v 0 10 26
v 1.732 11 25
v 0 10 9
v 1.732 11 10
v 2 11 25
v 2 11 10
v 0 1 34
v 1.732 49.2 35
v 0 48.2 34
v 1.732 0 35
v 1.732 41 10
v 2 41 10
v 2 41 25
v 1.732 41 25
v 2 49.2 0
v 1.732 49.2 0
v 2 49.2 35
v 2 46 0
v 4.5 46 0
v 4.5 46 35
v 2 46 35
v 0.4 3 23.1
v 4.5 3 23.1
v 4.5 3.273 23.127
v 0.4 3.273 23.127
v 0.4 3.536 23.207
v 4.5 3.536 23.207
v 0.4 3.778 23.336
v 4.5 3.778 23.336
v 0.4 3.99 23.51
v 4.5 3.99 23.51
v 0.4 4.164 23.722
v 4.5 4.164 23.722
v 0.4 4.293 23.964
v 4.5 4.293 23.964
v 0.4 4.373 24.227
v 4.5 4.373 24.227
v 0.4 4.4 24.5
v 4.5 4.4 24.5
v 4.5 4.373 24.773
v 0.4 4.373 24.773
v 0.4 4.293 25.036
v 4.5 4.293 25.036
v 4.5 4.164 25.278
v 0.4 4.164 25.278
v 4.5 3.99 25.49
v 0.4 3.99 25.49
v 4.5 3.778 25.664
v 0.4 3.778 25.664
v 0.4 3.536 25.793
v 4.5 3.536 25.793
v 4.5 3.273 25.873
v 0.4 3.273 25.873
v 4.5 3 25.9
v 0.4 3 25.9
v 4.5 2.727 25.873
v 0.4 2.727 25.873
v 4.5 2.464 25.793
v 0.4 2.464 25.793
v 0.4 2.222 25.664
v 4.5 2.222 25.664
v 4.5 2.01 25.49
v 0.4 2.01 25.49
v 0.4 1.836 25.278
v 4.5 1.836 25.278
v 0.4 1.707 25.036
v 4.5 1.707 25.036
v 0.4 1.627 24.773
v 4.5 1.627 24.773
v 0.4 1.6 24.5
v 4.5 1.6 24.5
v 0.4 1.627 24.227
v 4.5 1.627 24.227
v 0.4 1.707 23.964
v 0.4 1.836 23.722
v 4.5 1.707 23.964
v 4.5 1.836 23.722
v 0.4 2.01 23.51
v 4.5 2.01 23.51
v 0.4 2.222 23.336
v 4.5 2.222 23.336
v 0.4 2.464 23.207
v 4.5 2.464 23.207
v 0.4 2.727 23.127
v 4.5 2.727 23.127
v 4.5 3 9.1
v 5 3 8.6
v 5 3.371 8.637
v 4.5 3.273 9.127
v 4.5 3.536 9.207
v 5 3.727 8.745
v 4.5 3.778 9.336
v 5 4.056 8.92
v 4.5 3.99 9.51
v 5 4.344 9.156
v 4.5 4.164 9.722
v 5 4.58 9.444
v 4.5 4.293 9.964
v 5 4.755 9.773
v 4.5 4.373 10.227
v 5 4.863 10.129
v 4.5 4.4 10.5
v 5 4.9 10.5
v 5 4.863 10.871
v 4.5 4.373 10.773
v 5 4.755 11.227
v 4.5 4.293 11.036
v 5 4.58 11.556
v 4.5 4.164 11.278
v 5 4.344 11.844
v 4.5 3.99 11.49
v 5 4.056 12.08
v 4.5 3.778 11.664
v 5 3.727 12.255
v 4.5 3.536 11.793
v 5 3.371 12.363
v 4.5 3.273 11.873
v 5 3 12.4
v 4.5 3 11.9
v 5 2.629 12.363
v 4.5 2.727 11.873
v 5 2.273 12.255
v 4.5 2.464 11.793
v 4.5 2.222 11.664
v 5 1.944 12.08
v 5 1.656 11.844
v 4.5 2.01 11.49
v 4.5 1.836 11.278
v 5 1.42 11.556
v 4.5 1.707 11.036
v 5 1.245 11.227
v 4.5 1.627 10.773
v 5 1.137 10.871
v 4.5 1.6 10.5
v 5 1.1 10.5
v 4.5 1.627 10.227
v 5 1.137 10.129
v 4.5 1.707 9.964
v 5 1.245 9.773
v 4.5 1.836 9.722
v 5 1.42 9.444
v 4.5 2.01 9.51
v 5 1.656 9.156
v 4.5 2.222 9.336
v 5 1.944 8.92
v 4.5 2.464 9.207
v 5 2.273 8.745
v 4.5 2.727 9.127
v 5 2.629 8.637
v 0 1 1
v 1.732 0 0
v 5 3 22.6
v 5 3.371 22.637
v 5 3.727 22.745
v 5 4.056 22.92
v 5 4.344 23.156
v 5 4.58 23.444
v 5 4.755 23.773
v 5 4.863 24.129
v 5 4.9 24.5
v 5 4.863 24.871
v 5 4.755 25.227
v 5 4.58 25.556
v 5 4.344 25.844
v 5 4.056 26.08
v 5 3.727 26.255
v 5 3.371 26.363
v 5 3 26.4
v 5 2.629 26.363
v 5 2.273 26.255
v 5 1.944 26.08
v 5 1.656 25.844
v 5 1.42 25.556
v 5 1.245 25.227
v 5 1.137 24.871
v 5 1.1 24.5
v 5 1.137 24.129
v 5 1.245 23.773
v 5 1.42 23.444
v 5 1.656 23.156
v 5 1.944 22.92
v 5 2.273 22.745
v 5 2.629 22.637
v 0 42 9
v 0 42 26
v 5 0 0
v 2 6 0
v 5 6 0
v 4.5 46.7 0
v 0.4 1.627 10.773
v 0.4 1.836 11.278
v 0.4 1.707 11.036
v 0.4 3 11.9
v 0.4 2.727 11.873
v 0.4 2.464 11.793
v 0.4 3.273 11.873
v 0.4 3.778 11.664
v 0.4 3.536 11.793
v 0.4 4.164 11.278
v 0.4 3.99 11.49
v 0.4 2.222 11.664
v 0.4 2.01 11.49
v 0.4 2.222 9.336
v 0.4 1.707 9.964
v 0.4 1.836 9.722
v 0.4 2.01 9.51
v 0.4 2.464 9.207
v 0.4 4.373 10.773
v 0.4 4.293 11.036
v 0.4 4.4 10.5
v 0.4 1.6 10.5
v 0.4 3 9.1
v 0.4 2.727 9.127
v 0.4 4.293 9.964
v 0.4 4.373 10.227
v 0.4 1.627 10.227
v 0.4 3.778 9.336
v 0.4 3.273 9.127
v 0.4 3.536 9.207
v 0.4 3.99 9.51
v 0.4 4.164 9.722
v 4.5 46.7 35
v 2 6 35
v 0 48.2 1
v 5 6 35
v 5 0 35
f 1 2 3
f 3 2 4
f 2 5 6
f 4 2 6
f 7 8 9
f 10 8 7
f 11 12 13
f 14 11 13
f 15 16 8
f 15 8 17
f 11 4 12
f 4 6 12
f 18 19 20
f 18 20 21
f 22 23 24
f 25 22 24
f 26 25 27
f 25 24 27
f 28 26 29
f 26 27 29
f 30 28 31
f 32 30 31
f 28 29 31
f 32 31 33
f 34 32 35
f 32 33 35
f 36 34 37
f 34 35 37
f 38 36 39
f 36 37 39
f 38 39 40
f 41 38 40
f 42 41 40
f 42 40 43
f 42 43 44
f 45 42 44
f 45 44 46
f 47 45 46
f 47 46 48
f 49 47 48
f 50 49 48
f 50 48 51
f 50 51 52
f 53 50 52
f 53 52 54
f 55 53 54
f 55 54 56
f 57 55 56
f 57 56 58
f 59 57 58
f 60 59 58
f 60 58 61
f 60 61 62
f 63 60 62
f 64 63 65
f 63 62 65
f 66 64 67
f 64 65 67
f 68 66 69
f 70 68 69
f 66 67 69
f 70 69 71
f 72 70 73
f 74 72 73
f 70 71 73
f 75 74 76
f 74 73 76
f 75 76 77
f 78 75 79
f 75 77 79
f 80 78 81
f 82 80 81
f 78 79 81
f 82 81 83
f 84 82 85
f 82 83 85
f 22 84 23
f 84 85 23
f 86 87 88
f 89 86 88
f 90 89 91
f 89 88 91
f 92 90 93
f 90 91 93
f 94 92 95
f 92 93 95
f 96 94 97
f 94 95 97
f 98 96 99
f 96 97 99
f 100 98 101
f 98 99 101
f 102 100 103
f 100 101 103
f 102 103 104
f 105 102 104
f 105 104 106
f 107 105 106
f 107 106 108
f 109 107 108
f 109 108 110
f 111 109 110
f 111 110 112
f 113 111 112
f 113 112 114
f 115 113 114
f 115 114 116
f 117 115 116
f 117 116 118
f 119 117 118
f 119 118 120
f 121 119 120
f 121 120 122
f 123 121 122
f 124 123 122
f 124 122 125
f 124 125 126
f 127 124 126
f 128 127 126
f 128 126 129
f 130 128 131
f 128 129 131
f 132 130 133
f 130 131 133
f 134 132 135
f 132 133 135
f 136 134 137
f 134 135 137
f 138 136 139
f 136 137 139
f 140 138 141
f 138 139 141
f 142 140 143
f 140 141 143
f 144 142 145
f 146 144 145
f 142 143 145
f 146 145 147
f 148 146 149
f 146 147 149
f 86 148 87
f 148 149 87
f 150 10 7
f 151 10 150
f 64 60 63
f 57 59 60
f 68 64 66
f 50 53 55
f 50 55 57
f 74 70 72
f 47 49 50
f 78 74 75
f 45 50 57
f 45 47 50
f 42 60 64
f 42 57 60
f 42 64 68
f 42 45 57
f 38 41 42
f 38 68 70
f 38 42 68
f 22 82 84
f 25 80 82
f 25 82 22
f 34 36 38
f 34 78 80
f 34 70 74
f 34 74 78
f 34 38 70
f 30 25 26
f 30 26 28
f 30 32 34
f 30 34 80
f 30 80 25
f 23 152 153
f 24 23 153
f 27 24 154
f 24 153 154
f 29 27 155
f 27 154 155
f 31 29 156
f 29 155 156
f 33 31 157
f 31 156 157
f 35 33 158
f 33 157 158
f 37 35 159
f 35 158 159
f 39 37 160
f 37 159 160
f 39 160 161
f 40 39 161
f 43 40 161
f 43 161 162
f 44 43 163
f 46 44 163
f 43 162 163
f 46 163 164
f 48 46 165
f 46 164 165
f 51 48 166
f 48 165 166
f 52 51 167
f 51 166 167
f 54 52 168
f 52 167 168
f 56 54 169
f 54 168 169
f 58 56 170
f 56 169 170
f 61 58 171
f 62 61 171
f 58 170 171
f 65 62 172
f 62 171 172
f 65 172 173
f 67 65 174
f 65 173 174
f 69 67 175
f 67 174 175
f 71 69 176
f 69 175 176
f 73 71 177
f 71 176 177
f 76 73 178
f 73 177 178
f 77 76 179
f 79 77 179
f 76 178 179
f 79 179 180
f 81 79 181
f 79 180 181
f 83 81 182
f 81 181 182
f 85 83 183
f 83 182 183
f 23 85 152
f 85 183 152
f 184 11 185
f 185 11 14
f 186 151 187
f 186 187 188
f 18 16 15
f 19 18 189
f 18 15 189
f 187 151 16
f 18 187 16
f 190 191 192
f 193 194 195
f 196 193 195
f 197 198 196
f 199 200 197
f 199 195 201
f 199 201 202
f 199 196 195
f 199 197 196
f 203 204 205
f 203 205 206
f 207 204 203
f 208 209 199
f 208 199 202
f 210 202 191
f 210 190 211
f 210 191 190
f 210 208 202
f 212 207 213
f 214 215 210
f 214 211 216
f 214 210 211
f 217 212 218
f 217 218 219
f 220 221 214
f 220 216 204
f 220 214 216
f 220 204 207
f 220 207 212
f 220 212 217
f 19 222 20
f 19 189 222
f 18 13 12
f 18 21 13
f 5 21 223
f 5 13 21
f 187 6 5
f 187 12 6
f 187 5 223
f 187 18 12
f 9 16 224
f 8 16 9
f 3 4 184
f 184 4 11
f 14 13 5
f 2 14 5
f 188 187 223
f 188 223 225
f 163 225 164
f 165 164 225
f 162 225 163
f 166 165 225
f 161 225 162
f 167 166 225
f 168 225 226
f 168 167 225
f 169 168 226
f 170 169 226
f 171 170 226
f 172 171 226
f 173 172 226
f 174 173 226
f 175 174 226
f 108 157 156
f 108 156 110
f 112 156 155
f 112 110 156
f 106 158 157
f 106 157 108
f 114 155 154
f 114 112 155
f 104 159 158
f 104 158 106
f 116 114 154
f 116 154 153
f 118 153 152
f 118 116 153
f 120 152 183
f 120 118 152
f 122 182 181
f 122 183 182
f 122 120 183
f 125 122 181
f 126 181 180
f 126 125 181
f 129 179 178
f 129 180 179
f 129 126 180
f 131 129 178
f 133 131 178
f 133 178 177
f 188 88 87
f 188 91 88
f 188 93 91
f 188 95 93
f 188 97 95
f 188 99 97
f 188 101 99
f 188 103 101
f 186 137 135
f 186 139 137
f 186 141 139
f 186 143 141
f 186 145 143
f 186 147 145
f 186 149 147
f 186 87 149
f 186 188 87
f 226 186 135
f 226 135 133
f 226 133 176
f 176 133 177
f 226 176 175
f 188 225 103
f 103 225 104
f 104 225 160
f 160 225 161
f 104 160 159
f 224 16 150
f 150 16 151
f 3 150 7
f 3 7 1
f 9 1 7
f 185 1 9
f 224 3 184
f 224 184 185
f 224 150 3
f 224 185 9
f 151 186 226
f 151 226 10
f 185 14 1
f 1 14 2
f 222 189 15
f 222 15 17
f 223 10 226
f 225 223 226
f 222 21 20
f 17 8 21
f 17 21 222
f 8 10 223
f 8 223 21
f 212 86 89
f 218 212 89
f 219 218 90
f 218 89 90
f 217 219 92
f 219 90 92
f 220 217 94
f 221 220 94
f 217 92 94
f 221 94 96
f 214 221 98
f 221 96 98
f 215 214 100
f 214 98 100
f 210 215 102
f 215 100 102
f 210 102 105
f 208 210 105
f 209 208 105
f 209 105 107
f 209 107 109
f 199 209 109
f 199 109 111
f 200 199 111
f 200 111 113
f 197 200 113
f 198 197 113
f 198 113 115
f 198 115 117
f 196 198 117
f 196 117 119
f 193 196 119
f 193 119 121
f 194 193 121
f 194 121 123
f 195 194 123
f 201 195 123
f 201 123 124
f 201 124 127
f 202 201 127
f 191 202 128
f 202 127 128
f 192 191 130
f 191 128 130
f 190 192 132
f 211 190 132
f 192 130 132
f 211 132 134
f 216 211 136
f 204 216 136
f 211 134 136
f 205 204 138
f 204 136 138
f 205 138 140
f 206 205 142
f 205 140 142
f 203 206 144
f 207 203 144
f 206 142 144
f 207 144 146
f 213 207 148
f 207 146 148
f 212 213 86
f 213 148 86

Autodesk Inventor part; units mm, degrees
ref_plane "YZ Plane" through (0, 0, 0) normal (1, 0, 0) x (0, 1, 0)
ref_plane "XZ Plane" through (0, 0, 0) normal (0, 1, 0) x (-1, 0, 0)
ref_plane "XY Plane" through (0, 0, 0) normal (0, 0, 1) x (1, 0, 0)
sketch "Эскиз1" plane through (0, 0, 0) normal (0, 0, 1) x (1, 0, 0)
  line L0 (0, 0) -> (0, 49.2)
  line L1 (0, 49.2) -> (4.5, 49.2)
  line L2 (4.5, 49.2) -> (4.5, 46)
  line L3 (4.5, 46) -> (2, 46)
  line L4 (2, 46) -> (2, 6)
  line L5 (2, 6) -> (5, 6)
  line L6 (5, 6) -> (5, 0)
  line L7 (5, 0) -> (0, 0)
  dimension "d1" = 3
  dimension "d2" = 2.5
  dimension "d3" = 2
  dimension "d4" = 6
  dimension "d6" = 3.2
  dimension "d17" = 40
extrude "Выдавливание1" add sketch "Эскиз1" along normal blind 35
sketch "Эскиз2" plane through (5, 0, 0) normal (1, 0, 0) x (0, 0, -1)
  circle A0 centre (-24.5, 3) radius 1.4
  circle A1 centre (-10.5, 3) radius 1.4
  line L0 (0, 0) -> (-35, 0) projected
  line L1 (0, 0) -> (-35, 0) projected
  line L2 (0, 6) -> (-35, 6) projected
  point P0 (-17.5, 0)
  dimension "d9" = 2.8
  dimension "d10" = 2.8
  dimension "d11" = 14
  dimension "d12" = 7
  dimension "d13" = 3
  dimension "d14" = 6
extrude "Выдавливание2" cut sketch "Эскиз2" against normal blind 4.6
chamfer "Фаска1" distance 2.5 angle 45 1 edges at (4.5, 49.2, 17.5) measured on face at (4.5, 47.0667, 11.6667)
chamfer "Фаска2" distance 1 angle 60 4 edges at (0, 0, 17.5) (0, 49.2, 17.5) (0, 24.6, 0) (0, 24.6, 35) measured on face at (0, 32.8, 11.6667)
sketch "Эскиз3" plane through (2, 6, 0) normal (1, 0, 0) x (0, 0, -1)
  line L0 (-25, 5) -> (-10, 5)
  line L1 (-10, 5) -> (-10, 35)
  line L2 (-10, 35) -> (-25, 35)
  line L3 (-25, 35) -> (-25, 5)
  line L4 (-35, 0) -> (-35, 40) projected
  line L5 (0, 0) -> (0, 40) projected
  line L6 (0, 40) -> (-35, 40) projected
  point P0 (0, -6)
  dimension "d24" = 15
  dimension "d25" = 30
  dimension "d26" = 40
  dimension "d27" = 35
  dimension "d28" = 10
  dimension "d29" = 5
extrude "Выдавливание3" cut sketch "Эскиз3" against normal through all
chamfer "Фаска3" distance 0.5 angle 45 2 edges at (5, 3, 25.9) (5, 3, 11.9)
chamfer "Фаска4" distance 1 angle 60 4 edges at (0, 26, 10) (0, 11, 17.5) (0, 41, 17.5) (0, 26, 25) measured on face at (0, 20.0667, 31)
equation "\"d13\" = 0.5 * d14"
equation "\"d28\" = -0.5 * d24 + 0.5 * d27"
equation "\"d29\" = -0.5 * d25 + 0.5 * d26"
properties part number "Скоба"
